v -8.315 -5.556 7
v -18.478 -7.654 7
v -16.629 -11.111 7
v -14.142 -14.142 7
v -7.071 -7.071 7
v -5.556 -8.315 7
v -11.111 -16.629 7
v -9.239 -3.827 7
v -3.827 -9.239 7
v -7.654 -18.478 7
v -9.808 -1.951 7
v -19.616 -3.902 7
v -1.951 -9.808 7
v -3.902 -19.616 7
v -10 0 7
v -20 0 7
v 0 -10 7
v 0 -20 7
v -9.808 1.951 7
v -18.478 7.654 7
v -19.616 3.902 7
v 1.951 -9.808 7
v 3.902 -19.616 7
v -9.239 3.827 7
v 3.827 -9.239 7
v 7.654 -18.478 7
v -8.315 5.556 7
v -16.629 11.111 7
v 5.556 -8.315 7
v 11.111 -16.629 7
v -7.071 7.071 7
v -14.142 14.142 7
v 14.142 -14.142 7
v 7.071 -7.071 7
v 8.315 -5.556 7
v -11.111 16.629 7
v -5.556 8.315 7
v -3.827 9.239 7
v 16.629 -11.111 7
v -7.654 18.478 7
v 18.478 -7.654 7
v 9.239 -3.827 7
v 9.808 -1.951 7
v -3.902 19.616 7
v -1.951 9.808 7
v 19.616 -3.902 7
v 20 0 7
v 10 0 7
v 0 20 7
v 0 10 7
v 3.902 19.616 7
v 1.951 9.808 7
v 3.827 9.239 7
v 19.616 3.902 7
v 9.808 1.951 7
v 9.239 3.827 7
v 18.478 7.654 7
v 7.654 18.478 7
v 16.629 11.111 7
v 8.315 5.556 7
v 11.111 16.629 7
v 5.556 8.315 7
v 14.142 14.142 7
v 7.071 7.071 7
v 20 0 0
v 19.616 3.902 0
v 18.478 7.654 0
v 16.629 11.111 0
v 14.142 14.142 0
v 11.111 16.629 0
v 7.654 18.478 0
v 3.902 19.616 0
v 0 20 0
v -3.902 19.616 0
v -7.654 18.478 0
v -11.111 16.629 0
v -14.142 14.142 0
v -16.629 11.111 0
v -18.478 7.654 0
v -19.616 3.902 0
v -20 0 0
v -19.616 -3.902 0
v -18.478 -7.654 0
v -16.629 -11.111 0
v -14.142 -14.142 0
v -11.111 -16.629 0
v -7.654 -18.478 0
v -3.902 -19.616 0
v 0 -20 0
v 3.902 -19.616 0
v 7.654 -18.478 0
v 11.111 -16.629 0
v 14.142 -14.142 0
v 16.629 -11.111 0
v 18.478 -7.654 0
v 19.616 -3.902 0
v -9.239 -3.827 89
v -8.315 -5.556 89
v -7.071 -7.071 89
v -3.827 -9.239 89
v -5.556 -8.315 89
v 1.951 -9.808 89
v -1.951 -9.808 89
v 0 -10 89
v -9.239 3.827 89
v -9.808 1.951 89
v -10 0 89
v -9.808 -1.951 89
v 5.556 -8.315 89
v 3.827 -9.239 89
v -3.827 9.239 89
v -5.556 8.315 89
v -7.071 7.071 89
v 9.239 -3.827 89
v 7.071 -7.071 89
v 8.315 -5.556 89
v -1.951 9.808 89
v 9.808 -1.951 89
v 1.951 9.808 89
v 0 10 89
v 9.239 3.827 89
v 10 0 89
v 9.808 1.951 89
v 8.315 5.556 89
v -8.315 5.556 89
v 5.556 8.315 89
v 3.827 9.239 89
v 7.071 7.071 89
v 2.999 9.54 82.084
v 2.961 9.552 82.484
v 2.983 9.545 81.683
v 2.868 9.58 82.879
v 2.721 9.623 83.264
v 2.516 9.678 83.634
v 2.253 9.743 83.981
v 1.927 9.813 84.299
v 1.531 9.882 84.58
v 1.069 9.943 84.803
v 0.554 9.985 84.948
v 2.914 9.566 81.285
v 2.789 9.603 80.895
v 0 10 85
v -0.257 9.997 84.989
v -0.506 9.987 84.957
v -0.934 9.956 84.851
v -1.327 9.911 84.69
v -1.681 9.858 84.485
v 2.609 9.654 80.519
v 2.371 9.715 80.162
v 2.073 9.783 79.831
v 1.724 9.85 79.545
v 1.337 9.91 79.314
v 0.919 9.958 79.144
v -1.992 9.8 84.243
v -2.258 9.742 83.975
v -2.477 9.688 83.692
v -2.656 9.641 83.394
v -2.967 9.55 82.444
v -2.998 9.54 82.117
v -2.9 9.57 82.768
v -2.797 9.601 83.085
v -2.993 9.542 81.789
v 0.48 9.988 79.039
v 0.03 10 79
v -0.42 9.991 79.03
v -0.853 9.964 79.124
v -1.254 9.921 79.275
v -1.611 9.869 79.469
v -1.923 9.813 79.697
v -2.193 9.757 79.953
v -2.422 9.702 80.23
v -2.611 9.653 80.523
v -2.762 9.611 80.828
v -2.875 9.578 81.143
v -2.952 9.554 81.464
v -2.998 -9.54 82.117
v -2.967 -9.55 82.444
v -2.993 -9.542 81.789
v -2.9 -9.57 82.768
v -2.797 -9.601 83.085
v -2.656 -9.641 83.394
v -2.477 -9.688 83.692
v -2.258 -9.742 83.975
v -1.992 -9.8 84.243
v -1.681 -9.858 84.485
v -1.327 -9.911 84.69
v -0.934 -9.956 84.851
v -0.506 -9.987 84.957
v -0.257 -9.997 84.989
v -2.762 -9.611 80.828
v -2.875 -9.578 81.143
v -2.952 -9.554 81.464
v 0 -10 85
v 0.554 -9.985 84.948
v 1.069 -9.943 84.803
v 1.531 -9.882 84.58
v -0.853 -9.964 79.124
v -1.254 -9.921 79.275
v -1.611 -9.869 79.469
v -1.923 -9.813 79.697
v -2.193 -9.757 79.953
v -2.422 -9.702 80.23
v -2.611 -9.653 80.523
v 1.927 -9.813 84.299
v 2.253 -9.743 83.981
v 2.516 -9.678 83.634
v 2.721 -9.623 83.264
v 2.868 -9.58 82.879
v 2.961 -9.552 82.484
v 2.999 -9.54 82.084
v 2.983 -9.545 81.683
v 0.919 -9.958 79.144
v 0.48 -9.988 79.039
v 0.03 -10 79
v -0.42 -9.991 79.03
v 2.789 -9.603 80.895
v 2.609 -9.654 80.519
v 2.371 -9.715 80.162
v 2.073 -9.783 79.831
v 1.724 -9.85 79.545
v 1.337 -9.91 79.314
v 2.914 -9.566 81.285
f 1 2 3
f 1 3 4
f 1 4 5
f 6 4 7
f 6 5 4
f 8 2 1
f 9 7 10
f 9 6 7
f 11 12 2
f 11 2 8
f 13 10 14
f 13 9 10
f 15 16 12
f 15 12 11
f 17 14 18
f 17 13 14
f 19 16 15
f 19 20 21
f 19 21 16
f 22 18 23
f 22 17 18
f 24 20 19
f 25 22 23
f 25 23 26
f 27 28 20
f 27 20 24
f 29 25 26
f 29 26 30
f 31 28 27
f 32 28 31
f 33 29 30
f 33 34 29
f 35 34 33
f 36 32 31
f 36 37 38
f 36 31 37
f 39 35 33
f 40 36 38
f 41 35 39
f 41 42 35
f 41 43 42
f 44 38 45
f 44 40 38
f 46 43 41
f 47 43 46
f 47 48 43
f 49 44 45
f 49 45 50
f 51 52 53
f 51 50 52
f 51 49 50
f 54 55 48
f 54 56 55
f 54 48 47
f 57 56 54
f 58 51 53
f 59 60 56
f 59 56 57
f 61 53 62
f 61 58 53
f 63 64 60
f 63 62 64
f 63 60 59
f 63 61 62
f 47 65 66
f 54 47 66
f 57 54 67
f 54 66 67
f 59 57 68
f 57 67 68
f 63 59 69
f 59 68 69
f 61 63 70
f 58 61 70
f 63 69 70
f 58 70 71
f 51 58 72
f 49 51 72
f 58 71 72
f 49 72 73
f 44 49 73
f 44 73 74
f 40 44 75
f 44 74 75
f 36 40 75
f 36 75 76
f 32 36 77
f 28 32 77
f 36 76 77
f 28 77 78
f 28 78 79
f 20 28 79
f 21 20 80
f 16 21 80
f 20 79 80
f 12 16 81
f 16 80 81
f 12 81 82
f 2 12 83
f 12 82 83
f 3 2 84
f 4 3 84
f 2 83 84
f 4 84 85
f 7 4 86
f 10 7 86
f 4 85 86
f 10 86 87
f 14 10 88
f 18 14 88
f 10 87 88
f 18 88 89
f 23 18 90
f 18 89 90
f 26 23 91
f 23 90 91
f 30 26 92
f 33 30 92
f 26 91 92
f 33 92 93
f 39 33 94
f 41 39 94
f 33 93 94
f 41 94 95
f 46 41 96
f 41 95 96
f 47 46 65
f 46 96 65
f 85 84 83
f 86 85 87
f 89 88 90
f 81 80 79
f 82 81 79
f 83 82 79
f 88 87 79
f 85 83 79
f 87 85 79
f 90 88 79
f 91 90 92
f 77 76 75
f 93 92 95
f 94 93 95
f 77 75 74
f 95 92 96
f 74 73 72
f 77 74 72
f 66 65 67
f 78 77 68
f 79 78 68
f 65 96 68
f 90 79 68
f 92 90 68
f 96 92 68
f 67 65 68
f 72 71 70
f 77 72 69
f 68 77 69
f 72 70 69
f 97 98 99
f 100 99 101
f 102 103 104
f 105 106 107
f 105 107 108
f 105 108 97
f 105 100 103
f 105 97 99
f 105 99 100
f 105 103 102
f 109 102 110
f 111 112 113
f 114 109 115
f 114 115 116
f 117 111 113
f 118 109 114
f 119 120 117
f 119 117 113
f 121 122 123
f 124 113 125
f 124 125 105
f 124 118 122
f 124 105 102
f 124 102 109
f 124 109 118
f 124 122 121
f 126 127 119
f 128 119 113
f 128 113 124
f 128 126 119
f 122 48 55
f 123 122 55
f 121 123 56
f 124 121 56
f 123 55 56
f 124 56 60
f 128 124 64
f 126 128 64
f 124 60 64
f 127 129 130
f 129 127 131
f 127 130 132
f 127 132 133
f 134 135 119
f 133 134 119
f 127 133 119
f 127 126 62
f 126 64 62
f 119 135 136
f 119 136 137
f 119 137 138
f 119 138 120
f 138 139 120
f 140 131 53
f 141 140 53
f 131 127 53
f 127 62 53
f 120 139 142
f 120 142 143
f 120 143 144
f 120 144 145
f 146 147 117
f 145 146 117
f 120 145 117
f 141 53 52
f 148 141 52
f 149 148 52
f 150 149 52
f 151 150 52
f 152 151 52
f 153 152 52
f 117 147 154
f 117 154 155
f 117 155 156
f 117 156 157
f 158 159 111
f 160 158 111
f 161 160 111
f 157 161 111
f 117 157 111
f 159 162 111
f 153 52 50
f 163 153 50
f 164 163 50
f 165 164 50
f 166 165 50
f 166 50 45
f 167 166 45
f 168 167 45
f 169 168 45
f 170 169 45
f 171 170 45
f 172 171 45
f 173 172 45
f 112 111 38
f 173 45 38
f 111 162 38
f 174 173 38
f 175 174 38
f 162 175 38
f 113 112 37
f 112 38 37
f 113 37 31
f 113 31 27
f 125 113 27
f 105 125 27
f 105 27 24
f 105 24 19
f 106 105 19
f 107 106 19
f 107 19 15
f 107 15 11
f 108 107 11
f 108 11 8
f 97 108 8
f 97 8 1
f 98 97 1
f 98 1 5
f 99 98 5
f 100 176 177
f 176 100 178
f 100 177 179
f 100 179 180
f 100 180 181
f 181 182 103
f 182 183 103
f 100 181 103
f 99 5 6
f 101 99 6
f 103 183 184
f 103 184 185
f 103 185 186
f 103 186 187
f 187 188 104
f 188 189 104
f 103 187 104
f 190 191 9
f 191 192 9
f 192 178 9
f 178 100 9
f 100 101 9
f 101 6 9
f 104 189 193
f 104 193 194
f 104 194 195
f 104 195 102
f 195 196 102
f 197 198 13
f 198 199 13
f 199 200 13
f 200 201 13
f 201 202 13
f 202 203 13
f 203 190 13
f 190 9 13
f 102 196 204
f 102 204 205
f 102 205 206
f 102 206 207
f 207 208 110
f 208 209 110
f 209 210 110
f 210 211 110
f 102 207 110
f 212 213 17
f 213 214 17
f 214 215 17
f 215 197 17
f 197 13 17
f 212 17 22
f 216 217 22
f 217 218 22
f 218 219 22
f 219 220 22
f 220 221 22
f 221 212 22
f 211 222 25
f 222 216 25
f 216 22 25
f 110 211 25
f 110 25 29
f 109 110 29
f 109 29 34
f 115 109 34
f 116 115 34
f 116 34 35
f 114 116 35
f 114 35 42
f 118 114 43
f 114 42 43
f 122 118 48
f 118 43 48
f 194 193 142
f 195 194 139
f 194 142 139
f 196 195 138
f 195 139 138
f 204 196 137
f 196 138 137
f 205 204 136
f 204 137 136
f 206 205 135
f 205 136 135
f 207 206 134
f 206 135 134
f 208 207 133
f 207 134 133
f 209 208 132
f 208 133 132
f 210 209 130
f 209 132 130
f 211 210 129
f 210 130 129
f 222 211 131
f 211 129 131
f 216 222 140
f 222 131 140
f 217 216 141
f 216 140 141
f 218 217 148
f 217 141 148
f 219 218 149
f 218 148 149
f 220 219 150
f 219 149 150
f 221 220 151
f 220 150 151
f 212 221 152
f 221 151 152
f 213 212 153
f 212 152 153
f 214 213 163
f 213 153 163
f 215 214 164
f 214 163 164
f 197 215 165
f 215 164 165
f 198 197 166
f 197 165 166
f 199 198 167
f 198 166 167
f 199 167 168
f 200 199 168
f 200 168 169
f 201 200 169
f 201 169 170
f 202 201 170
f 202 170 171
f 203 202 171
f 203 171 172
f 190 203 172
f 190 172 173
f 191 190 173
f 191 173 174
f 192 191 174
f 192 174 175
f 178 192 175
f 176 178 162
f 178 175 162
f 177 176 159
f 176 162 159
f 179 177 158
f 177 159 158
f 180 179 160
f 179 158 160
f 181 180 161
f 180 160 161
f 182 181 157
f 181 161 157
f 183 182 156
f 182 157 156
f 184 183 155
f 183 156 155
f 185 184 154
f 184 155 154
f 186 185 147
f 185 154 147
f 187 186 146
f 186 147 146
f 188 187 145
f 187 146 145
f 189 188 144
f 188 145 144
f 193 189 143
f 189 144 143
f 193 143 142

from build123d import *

# Parameters (mm, degrees)
IZIM1_R                     = 20
Y_KSEKLIK_EKSTR_ZYON1_DEPTH = 7
IZIM2_R                     = 10
Y_KSEKLIK_EKSTR_ZYON2_DEPTH = 82
IZIM3_R                     = 3
KES_EKSTR_ZYON1_DEPTH       = 41


with BuildPart() as part:
    # Çizim1 → Yükseklik-Ekstrüzyon1 (new body)
    with BuildSketch(Plane.XY):
        Circle(IZIM1_R)
    extrude(amount=Y_KSEKLIK_EKSTR_ZYON1_DEPTH)

    # Çizim2 → Yükseklik-Ekstrüzyon2 (add)
    with BuildSketch(Plane.XY.offset(7)):
        Circle(IZIM2_R)
    extrude(amount=Y_KSEKLIK_EKSTR_ZYON2_DEPTH)

    # Çizim3 → Kes-Ekstrüzyon1 (cut, symmetric)
    with BuildSketch(Plane(origin=(0, 0, 0), x_dir=(1, 0, 0), z_dir=(0, 1, 0))):
        with Locations(Location((0, -82, 0), (0, 0, 270))):
            Circle(IZIM3_R)
    extrude(amount=KES_EKSTR_ZYON1_DEPTH, both=True, mode=Mode.SUBTRACT)


solid = part.part
